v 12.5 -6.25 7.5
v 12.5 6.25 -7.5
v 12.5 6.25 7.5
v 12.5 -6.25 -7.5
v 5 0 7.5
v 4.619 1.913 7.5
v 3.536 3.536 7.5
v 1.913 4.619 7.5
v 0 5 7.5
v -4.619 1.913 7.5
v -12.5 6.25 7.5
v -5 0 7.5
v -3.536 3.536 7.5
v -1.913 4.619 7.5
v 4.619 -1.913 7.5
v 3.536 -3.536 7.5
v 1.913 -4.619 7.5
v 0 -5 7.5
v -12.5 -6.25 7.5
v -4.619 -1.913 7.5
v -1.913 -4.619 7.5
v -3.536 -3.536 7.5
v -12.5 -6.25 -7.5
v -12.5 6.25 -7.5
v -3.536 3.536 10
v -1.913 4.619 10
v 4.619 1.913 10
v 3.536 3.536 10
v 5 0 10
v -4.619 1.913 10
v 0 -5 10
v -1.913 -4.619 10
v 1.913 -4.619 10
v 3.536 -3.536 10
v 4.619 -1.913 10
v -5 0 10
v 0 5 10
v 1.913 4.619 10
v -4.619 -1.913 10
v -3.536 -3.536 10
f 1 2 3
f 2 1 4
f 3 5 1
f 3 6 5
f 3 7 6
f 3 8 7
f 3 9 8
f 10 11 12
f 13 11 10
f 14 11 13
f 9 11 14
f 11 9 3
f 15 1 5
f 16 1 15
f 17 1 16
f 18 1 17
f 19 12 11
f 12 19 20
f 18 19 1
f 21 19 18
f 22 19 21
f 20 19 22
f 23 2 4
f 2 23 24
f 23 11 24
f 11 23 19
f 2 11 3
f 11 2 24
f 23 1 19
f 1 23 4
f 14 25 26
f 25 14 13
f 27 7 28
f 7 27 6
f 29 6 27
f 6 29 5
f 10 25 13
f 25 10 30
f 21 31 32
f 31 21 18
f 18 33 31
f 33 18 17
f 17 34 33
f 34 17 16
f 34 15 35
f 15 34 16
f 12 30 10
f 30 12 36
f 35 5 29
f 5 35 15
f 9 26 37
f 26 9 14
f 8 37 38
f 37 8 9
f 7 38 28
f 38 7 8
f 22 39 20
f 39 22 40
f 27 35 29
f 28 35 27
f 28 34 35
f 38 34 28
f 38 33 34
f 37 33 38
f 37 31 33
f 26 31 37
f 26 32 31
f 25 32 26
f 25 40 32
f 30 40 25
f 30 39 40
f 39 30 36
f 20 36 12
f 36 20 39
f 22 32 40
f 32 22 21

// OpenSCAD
//http://www.digikey.com/product-detail/en/te-connectivity-potter-brumfield-relays/W58-XC4C12A-7/PB246-ND/254464
module make_w58_series(){
    cube([34.93, 34.93, 16.76], center=true);
    translate([34.93/2,0,0])
    cylinder(d=10, h=16.76, center=true);
    translate([-34.93/2,0,0])
    rotate([0,90,0])
    cylinder(d=10, h=16.76, center=true);
}

module make_ts_701(){
    cube([35.5, 31, 13], center=true);
    translate([35.5/2,0,0])
    cylinder(d=10, h=13, center=true);
    translate([-35.5/2,0,0])
    rotate([0,90,0])
    cylinder(d=10, h=16.76, center=true);
}

module make_104_pr(){
    cube([27.6, 21, 11], center=true);
    translate([-27.6/2,0,0])
    rotate([0,90,0])
    cylinder(d=10, h=5, center=true);
}

//http://www.e-t-a.com/fileadmin/user_upload/Ordnerstruktur/pdf-Data/Products/Elektromechanik/1_pdf_thermisch/1_pdf_englisch/D_1410-L1_L4_ENG.pdf
module make_1410(){
    cube([25, 12.5, 15], center=true);
    translate([0,0,15/2])
    rotate([0,0,0])
    cylinder(d=10, h=5, center=true);
}

//make_w58_series();
//make_ts_701();
//make_104_pr();
make_1410();
